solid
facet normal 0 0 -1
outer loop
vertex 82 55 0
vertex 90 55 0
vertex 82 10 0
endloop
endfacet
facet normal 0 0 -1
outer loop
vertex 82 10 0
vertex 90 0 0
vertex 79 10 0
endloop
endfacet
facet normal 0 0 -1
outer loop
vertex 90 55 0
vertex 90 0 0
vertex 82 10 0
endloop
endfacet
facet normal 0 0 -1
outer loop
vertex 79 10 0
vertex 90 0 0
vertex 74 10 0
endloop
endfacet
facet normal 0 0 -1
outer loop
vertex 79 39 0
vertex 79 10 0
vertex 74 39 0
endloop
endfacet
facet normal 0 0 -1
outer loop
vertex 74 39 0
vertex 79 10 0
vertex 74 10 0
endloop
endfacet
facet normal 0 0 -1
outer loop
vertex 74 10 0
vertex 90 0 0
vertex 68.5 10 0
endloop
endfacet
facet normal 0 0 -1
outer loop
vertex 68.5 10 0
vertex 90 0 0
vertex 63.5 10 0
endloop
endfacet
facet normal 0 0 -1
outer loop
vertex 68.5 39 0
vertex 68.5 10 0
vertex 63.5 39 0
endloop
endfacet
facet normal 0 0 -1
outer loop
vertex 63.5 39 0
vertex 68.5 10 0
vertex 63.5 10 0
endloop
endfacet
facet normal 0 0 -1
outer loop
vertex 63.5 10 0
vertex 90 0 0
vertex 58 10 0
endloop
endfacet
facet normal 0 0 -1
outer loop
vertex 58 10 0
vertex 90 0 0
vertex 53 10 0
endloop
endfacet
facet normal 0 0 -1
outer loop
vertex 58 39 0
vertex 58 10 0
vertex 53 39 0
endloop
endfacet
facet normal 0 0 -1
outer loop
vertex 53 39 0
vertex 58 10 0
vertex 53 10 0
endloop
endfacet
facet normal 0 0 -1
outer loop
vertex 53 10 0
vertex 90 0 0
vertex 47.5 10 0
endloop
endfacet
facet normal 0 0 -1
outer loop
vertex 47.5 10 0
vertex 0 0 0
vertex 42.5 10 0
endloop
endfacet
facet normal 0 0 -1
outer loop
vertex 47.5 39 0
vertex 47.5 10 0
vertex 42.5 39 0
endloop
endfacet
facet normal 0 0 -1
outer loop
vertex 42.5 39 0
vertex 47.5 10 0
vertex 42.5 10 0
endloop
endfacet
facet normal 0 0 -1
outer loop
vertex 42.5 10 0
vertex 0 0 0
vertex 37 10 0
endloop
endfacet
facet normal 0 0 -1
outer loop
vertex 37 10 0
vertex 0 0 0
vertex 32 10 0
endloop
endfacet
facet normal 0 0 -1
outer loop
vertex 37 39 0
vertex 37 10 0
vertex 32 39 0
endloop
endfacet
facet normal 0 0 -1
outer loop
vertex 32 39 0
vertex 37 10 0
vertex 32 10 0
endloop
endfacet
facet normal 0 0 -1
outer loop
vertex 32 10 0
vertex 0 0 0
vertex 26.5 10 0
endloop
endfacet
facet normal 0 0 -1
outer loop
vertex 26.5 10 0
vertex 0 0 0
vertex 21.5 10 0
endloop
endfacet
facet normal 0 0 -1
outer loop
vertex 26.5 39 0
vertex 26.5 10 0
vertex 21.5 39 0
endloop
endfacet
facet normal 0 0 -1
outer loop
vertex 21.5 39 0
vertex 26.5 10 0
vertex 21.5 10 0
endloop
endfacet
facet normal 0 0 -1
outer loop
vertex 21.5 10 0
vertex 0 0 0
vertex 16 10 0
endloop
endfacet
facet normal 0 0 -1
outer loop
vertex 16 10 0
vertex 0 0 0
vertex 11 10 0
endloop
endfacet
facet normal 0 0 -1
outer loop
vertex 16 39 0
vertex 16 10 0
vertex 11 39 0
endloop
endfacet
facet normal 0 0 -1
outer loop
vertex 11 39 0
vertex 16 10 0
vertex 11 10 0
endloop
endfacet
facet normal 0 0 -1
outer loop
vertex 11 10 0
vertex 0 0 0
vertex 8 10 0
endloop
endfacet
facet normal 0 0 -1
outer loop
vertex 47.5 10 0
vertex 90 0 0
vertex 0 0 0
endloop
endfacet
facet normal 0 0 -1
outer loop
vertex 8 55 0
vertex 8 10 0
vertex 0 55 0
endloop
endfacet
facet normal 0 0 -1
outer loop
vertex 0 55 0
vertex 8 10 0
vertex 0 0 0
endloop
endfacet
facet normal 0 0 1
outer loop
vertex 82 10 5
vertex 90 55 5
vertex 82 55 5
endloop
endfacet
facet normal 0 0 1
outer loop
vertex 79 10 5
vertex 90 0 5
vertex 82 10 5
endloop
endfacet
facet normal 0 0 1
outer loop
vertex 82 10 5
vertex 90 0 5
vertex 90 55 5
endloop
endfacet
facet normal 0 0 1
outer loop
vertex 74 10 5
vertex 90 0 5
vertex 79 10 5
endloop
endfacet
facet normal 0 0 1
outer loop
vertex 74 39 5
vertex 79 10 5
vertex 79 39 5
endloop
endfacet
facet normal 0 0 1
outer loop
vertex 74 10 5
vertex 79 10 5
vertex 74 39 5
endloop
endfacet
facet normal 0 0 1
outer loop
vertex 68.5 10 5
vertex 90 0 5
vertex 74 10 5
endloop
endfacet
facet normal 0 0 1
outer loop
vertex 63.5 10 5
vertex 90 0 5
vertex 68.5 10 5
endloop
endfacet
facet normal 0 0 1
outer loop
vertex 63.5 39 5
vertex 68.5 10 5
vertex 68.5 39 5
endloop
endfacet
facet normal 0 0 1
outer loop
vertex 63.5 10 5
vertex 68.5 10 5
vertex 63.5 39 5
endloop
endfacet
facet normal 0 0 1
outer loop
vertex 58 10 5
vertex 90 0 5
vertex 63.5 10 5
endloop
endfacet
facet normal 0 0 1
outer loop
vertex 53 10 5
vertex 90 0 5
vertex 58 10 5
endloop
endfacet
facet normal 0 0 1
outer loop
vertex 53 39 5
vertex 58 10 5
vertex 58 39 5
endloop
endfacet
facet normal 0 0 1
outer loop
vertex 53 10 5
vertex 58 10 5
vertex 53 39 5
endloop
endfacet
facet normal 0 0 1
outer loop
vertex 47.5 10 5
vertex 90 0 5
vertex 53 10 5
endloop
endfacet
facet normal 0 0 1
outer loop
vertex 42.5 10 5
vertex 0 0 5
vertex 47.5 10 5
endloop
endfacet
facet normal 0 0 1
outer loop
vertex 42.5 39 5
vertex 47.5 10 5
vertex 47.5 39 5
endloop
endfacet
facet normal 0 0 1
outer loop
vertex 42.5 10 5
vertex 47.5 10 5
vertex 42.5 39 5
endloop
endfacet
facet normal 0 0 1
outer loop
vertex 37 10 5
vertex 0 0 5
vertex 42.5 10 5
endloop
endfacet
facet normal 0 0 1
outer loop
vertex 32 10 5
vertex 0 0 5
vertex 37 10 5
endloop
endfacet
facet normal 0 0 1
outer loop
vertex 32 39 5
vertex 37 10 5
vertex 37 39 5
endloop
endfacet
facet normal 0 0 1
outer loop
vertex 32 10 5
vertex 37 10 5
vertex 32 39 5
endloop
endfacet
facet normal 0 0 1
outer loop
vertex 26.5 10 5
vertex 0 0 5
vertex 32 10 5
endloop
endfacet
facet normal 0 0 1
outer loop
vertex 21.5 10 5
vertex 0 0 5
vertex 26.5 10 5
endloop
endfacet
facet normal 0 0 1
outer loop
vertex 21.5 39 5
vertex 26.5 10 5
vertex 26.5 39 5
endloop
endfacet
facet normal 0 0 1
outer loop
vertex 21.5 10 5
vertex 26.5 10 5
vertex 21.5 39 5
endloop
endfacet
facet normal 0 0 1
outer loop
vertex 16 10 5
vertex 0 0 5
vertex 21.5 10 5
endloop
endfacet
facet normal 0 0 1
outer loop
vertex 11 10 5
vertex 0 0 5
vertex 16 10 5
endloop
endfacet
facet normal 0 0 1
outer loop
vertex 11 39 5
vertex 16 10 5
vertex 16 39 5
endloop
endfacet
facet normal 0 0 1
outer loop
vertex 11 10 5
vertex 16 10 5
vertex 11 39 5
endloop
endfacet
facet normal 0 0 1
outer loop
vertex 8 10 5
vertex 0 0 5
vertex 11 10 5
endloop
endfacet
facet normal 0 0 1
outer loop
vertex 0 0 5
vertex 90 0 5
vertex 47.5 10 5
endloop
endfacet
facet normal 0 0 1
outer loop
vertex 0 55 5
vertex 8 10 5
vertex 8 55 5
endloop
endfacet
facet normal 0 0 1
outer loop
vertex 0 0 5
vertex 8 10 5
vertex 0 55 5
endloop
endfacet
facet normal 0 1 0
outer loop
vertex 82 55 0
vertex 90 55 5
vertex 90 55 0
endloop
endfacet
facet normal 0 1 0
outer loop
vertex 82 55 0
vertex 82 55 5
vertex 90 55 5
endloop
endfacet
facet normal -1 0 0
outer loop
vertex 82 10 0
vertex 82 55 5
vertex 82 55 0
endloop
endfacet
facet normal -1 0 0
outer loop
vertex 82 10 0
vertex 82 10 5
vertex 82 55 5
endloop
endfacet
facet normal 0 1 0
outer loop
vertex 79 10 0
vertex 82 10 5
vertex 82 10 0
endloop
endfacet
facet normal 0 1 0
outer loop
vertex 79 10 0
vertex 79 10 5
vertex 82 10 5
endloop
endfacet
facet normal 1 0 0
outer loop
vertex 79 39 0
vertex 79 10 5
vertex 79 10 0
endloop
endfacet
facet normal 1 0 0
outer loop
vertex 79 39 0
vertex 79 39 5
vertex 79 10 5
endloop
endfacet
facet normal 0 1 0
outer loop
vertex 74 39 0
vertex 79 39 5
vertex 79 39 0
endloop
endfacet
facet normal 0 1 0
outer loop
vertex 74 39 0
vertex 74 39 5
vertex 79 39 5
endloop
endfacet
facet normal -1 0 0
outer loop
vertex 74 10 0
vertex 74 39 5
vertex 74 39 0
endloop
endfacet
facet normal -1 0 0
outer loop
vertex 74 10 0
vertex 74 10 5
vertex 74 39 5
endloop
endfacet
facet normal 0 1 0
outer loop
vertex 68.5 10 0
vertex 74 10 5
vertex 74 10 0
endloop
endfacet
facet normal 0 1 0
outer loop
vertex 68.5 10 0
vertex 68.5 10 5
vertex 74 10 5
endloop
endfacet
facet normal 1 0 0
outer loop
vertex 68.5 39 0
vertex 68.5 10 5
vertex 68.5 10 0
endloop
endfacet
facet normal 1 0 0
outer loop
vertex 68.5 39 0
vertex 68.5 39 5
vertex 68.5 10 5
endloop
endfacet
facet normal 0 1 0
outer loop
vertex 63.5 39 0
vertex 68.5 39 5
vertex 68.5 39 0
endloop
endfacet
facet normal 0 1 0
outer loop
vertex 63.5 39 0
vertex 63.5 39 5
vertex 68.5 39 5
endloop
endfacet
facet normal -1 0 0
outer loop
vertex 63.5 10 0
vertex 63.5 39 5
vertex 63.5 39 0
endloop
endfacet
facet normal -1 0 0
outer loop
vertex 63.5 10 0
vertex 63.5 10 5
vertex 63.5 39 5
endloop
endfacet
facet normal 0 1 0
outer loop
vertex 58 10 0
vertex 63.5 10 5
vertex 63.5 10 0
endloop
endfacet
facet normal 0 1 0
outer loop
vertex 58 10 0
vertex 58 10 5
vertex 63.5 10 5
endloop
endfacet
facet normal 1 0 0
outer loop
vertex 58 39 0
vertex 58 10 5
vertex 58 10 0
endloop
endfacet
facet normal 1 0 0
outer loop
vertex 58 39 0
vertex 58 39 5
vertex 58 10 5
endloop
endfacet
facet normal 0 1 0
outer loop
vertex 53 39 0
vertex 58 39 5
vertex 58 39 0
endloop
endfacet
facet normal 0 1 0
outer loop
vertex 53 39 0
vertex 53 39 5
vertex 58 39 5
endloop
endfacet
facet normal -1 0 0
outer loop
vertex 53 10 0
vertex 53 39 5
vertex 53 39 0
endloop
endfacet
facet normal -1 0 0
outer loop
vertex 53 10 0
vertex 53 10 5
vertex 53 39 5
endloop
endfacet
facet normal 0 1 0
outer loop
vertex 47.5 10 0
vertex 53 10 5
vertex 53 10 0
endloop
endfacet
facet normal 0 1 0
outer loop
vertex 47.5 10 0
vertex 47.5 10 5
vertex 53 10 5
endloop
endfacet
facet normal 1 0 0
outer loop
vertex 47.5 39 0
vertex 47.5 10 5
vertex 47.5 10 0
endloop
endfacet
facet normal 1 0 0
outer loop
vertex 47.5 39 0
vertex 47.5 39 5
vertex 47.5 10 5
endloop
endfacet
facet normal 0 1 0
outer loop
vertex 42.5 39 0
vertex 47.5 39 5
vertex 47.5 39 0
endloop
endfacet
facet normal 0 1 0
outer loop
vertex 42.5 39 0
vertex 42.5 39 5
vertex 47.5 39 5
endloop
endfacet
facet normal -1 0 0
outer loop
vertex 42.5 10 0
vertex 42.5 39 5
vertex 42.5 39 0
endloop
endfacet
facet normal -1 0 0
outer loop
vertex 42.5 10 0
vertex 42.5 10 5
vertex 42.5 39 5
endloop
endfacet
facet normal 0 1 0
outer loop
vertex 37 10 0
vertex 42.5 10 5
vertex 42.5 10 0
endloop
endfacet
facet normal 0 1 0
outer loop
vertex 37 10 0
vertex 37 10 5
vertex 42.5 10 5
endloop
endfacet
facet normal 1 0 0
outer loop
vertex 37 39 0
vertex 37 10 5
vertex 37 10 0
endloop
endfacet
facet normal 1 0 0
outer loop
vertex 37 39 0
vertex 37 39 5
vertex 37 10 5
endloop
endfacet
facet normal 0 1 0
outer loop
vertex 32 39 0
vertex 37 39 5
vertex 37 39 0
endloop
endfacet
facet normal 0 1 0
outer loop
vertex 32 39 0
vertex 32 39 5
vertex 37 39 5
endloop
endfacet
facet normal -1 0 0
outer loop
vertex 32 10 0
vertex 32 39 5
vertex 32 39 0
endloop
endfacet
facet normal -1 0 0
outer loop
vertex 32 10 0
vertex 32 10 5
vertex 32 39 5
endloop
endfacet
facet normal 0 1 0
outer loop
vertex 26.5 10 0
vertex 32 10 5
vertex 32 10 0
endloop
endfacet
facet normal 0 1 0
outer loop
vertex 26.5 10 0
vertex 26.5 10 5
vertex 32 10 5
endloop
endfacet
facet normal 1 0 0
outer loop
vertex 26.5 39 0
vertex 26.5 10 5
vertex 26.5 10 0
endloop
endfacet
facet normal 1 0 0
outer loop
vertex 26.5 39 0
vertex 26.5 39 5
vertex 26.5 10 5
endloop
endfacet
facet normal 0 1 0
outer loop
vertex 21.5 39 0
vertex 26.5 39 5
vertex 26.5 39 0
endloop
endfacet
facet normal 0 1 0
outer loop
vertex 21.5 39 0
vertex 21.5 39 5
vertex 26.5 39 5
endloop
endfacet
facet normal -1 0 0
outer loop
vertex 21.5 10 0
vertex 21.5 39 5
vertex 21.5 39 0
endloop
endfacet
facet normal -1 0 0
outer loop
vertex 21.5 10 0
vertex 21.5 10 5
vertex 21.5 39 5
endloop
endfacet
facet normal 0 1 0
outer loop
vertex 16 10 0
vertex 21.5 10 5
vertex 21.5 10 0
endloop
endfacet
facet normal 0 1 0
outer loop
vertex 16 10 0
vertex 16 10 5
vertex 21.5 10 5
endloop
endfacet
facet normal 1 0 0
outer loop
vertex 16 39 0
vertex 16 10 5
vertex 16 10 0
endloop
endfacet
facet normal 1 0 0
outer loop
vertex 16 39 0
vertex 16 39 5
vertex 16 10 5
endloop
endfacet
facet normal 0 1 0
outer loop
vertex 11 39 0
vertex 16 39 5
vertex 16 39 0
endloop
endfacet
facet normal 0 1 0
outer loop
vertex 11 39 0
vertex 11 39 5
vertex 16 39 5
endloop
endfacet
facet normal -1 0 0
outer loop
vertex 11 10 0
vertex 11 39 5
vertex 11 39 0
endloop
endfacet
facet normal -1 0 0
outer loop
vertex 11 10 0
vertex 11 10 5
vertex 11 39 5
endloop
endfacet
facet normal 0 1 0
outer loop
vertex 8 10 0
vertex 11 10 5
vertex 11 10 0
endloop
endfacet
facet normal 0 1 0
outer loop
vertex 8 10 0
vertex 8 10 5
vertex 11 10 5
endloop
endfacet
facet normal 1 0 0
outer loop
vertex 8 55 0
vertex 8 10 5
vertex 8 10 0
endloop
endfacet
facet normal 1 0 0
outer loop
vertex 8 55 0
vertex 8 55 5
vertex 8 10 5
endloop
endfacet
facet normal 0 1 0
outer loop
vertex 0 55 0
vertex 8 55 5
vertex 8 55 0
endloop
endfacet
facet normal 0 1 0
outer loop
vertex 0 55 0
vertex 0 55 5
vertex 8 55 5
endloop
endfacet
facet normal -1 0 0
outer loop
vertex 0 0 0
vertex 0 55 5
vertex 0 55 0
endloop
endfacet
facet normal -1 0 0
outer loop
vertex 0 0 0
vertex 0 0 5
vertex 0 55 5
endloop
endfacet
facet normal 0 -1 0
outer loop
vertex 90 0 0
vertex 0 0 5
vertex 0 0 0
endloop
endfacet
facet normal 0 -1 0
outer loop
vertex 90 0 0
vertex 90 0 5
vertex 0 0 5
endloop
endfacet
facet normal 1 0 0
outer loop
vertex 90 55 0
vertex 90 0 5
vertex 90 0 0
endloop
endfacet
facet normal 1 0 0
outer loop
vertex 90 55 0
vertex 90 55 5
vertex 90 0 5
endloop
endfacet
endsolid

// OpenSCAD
$fn = 32;

// ----------------------------------------------------------------------
// Guard grille: 7 slats over a 90 x 55 mm plate
// ----------------------------------------------------------------------

// --- parameters (mm) ---
profile_height = 5;       // extrusion height
profile_points = 36;      // points of the closed outline

profile = [[0, 0], [90, 0], [90, 55], [82, 55], [82, 10], [79, 10], [79, 39], [74, 39], [74, 10], [68.5, 10], [68.5, 39], [63.5, 39], [63.5, 10], [58, 10], [58, 39], [53, 39], [53, 10], [47.5, 10], [47.5, 39], [42.5, 39], [42.5, 10], [37, 10], [37, 39], [32, 39], [32, 10], [26.5, 10], [26.5, 39], [21.5, 39], [21.5, 10], [16, 10], [16, 39], [11, 39], [11, 10], [8, 10], [8, 55], [0, 55]];  // single closed polygon, 36 points, counter clockwise

// --- the one profile operation ---
linear_extrude(height = profile_height) polygon(points = profile);
